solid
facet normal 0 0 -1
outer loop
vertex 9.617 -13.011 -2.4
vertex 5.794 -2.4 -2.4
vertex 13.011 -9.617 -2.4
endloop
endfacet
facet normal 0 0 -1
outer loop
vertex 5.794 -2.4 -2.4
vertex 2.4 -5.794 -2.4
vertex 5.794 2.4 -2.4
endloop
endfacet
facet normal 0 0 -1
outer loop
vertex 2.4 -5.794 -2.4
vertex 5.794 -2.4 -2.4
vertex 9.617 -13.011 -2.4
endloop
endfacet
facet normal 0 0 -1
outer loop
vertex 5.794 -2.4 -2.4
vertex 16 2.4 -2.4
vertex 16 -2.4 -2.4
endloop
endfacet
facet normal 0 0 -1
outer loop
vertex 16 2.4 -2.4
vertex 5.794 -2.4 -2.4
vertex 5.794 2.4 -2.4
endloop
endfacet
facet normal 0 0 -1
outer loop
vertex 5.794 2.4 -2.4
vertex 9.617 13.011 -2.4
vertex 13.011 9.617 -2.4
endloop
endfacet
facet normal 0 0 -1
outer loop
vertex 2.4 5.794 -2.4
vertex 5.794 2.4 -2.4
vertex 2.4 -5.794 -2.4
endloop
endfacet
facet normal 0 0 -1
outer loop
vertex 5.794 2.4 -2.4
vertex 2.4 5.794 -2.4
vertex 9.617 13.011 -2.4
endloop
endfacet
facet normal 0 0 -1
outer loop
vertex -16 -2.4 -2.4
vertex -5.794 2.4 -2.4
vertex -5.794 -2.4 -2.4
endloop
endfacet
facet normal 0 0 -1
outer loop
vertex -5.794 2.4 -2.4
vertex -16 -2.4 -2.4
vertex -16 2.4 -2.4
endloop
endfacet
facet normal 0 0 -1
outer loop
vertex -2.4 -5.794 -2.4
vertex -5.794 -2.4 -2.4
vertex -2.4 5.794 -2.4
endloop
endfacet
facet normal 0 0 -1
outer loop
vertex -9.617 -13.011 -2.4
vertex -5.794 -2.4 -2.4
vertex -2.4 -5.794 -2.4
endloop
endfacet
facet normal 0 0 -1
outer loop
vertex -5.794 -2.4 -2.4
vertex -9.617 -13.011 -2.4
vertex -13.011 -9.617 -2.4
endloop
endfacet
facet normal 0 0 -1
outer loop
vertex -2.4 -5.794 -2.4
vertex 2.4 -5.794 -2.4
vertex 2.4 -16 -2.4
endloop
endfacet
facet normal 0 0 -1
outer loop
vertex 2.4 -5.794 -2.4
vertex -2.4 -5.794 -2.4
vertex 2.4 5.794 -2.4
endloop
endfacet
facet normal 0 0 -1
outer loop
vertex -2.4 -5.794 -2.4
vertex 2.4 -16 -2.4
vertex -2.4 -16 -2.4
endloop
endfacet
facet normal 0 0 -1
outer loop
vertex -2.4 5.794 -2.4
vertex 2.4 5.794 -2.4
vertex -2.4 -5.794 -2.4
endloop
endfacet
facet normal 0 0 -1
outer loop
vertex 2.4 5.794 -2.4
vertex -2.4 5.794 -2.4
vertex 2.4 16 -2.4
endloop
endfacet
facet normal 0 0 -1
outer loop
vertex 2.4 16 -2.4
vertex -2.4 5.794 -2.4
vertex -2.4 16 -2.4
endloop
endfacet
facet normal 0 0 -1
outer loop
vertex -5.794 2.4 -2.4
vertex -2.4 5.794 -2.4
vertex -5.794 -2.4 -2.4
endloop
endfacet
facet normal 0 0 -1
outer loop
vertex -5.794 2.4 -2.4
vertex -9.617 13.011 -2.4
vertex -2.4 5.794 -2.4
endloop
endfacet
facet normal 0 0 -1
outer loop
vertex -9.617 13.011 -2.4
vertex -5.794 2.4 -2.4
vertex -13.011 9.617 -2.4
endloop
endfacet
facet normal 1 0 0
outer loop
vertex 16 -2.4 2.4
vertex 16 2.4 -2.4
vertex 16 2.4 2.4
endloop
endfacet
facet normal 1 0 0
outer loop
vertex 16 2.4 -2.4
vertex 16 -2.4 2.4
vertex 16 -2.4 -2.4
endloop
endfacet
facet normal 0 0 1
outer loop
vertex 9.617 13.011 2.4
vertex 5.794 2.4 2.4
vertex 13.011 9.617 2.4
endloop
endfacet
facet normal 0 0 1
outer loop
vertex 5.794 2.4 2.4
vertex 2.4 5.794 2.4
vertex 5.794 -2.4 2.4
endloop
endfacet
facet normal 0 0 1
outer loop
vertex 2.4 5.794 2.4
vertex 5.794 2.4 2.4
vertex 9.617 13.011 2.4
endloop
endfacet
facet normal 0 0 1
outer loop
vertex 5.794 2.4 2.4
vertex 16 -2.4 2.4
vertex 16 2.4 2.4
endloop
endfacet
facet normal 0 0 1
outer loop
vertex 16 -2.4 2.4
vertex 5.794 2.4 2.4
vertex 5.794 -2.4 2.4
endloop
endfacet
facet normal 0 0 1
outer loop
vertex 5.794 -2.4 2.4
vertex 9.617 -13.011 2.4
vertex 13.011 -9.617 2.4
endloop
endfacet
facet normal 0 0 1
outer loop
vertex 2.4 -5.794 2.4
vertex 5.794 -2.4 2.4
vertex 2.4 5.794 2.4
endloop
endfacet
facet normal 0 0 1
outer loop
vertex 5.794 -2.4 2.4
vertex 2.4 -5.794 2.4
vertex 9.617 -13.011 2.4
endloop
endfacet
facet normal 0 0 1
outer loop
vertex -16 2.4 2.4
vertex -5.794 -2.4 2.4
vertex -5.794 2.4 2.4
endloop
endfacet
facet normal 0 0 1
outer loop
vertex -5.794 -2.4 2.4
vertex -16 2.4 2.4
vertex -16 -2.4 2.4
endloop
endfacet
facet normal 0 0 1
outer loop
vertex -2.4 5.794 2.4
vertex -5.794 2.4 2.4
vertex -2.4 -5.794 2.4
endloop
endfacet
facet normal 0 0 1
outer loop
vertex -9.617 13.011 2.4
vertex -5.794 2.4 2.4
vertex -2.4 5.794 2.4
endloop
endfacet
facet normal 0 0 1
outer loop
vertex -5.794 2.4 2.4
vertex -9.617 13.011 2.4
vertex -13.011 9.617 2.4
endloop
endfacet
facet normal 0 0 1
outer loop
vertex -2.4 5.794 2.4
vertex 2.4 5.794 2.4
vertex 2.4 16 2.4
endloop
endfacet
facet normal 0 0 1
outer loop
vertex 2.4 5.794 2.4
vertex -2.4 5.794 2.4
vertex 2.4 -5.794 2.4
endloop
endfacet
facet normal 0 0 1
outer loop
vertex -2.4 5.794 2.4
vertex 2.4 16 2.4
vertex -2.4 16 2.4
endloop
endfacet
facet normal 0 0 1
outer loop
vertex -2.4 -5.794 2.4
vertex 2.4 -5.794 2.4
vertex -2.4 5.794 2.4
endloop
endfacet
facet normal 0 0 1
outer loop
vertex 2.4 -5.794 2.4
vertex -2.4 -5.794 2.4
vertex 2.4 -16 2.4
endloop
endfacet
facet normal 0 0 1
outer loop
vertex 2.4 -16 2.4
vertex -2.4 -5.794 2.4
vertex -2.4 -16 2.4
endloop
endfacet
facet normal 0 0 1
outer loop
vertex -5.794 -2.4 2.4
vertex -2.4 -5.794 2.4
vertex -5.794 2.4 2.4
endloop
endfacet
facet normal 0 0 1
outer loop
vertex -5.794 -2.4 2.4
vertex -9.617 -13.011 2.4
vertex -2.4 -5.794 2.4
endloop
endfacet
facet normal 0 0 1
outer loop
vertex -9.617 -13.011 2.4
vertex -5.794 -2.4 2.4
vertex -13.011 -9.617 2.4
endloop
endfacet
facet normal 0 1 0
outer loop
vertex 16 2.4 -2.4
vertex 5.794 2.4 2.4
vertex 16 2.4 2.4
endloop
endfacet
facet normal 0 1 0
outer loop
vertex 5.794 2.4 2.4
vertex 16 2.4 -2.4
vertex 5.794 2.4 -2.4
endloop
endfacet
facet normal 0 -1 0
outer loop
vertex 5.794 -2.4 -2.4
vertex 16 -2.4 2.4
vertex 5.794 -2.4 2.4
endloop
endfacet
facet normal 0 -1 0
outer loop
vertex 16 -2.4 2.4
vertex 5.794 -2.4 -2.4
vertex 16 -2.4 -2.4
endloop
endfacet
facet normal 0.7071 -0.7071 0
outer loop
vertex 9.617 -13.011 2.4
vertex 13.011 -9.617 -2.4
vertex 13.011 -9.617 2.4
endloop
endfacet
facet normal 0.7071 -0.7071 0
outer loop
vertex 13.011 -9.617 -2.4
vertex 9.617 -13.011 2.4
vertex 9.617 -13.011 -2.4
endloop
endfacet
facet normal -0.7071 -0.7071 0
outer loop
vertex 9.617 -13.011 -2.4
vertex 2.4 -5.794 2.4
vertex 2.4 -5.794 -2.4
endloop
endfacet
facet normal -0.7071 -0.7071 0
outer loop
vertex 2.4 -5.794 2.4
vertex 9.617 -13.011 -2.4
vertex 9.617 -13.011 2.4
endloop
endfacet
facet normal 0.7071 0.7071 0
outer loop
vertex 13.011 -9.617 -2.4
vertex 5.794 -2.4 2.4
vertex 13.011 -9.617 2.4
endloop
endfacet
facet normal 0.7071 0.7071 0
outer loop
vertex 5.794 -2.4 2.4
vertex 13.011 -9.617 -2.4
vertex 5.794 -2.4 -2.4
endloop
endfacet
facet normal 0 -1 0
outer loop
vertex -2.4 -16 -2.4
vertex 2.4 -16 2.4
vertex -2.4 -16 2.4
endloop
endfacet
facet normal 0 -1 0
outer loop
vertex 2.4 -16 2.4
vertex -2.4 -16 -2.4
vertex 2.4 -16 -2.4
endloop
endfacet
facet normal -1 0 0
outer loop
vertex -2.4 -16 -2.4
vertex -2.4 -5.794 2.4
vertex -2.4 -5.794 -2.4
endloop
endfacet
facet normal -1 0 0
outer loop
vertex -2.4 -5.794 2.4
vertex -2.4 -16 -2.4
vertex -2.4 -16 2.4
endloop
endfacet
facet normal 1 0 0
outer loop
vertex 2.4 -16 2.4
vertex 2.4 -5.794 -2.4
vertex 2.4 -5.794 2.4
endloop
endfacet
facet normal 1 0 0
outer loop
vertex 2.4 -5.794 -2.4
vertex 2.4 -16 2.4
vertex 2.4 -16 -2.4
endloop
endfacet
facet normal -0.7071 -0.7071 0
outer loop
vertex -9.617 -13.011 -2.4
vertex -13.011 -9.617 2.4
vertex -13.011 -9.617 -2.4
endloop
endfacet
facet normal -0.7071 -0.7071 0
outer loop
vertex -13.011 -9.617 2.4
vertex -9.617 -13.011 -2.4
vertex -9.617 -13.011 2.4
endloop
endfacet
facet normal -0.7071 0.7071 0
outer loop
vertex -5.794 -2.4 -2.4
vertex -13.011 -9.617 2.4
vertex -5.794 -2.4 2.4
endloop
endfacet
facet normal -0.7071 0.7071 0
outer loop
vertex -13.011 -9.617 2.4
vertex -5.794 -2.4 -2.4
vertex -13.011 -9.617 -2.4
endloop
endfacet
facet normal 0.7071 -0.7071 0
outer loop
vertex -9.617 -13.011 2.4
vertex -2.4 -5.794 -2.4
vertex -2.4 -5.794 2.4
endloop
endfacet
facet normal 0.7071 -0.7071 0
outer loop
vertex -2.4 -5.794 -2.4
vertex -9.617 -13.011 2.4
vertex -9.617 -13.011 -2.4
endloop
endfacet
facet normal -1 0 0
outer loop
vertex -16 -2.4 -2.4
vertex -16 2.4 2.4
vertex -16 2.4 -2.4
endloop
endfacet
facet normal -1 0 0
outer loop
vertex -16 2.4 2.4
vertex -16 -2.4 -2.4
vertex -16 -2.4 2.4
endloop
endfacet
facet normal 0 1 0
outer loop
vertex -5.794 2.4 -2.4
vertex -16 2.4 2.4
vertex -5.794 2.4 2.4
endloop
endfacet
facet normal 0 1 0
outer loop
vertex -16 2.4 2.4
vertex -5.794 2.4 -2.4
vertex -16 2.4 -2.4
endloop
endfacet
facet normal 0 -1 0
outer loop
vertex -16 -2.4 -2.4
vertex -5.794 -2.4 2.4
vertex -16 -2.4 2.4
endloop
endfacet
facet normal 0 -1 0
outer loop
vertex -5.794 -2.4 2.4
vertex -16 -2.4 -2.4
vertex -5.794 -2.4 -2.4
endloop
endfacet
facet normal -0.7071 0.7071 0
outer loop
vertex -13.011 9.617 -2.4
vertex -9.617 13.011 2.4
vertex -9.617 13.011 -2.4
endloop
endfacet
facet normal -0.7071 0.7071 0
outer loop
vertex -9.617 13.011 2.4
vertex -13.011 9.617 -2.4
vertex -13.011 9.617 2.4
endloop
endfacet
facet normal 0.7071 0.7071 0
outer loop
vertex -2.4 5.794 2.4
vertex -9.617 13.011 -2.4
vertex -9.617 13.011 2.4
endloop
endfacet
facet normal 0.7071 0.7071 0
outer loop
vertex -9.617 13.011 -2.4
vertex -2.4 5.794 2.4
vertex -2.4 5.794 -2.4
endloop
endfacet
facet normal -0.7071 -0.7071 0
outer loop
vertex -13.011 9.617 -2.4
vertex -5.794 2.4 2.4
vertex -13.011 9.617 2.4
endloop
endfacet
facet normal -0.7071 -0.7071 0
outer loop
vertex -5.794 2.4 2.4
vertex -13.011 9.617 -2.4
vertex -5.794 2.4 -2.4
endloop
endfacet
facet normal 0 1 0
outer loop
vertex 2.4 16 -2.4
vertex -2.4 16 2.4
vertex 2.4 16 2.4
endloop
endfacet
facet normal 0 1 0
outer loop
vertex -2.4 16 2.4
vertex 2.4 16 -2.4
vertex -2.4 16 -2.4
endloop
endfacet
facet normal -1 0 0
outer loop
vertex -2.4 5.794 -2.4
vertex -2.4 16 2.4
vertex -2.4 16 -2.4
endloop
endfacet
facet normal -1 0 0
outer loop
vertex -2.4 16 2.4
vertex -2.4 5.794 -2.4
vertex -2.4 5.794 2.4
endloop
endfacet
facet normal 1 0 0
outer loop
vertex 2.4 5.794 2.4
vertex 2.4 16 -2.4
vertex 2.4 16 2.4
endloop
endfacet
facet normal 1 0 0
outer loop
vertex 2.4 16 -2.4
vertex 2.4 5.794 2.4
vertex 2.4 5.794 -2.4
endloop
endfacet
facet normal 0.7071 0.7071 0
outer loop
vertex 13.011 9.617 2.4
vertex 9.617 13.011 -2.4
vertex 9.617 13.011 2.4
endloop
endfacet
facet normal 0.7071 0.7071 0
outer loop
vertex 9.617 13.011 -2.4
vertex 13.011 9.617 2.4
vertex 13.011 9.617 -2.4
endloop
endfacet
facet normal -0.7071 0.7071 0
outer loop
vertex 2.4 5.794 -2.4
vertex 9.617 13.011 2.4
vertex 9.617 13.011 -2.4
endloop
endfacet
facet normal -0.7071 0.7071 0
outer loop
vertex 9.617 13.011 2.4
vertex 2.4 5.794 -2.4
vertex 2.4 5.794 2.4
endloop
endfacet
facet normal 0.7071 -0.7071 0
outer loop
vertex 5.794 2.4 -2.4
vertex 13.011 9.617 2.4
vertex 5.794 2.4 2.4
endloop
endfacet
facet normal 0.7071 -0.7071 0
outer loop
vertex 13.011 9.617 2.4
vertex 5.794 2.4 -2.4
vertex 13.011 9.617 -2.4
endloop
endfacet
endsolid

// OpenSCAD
size = 32;//block=32 //item=8


end = 8;
for(curr = [0:1:end]) {
  rotate([0, 90, 0]) {
    rotate([360 / end * curr, 0, 0]) {
      translate([0, 0, size * 0.25]) {
        cube([size * 0.15, size * 0.15, size * 0.5], center = true);
      }
      ;//translate
    }
    ;//rotate
  }
  ;//rotate

}
;//for
